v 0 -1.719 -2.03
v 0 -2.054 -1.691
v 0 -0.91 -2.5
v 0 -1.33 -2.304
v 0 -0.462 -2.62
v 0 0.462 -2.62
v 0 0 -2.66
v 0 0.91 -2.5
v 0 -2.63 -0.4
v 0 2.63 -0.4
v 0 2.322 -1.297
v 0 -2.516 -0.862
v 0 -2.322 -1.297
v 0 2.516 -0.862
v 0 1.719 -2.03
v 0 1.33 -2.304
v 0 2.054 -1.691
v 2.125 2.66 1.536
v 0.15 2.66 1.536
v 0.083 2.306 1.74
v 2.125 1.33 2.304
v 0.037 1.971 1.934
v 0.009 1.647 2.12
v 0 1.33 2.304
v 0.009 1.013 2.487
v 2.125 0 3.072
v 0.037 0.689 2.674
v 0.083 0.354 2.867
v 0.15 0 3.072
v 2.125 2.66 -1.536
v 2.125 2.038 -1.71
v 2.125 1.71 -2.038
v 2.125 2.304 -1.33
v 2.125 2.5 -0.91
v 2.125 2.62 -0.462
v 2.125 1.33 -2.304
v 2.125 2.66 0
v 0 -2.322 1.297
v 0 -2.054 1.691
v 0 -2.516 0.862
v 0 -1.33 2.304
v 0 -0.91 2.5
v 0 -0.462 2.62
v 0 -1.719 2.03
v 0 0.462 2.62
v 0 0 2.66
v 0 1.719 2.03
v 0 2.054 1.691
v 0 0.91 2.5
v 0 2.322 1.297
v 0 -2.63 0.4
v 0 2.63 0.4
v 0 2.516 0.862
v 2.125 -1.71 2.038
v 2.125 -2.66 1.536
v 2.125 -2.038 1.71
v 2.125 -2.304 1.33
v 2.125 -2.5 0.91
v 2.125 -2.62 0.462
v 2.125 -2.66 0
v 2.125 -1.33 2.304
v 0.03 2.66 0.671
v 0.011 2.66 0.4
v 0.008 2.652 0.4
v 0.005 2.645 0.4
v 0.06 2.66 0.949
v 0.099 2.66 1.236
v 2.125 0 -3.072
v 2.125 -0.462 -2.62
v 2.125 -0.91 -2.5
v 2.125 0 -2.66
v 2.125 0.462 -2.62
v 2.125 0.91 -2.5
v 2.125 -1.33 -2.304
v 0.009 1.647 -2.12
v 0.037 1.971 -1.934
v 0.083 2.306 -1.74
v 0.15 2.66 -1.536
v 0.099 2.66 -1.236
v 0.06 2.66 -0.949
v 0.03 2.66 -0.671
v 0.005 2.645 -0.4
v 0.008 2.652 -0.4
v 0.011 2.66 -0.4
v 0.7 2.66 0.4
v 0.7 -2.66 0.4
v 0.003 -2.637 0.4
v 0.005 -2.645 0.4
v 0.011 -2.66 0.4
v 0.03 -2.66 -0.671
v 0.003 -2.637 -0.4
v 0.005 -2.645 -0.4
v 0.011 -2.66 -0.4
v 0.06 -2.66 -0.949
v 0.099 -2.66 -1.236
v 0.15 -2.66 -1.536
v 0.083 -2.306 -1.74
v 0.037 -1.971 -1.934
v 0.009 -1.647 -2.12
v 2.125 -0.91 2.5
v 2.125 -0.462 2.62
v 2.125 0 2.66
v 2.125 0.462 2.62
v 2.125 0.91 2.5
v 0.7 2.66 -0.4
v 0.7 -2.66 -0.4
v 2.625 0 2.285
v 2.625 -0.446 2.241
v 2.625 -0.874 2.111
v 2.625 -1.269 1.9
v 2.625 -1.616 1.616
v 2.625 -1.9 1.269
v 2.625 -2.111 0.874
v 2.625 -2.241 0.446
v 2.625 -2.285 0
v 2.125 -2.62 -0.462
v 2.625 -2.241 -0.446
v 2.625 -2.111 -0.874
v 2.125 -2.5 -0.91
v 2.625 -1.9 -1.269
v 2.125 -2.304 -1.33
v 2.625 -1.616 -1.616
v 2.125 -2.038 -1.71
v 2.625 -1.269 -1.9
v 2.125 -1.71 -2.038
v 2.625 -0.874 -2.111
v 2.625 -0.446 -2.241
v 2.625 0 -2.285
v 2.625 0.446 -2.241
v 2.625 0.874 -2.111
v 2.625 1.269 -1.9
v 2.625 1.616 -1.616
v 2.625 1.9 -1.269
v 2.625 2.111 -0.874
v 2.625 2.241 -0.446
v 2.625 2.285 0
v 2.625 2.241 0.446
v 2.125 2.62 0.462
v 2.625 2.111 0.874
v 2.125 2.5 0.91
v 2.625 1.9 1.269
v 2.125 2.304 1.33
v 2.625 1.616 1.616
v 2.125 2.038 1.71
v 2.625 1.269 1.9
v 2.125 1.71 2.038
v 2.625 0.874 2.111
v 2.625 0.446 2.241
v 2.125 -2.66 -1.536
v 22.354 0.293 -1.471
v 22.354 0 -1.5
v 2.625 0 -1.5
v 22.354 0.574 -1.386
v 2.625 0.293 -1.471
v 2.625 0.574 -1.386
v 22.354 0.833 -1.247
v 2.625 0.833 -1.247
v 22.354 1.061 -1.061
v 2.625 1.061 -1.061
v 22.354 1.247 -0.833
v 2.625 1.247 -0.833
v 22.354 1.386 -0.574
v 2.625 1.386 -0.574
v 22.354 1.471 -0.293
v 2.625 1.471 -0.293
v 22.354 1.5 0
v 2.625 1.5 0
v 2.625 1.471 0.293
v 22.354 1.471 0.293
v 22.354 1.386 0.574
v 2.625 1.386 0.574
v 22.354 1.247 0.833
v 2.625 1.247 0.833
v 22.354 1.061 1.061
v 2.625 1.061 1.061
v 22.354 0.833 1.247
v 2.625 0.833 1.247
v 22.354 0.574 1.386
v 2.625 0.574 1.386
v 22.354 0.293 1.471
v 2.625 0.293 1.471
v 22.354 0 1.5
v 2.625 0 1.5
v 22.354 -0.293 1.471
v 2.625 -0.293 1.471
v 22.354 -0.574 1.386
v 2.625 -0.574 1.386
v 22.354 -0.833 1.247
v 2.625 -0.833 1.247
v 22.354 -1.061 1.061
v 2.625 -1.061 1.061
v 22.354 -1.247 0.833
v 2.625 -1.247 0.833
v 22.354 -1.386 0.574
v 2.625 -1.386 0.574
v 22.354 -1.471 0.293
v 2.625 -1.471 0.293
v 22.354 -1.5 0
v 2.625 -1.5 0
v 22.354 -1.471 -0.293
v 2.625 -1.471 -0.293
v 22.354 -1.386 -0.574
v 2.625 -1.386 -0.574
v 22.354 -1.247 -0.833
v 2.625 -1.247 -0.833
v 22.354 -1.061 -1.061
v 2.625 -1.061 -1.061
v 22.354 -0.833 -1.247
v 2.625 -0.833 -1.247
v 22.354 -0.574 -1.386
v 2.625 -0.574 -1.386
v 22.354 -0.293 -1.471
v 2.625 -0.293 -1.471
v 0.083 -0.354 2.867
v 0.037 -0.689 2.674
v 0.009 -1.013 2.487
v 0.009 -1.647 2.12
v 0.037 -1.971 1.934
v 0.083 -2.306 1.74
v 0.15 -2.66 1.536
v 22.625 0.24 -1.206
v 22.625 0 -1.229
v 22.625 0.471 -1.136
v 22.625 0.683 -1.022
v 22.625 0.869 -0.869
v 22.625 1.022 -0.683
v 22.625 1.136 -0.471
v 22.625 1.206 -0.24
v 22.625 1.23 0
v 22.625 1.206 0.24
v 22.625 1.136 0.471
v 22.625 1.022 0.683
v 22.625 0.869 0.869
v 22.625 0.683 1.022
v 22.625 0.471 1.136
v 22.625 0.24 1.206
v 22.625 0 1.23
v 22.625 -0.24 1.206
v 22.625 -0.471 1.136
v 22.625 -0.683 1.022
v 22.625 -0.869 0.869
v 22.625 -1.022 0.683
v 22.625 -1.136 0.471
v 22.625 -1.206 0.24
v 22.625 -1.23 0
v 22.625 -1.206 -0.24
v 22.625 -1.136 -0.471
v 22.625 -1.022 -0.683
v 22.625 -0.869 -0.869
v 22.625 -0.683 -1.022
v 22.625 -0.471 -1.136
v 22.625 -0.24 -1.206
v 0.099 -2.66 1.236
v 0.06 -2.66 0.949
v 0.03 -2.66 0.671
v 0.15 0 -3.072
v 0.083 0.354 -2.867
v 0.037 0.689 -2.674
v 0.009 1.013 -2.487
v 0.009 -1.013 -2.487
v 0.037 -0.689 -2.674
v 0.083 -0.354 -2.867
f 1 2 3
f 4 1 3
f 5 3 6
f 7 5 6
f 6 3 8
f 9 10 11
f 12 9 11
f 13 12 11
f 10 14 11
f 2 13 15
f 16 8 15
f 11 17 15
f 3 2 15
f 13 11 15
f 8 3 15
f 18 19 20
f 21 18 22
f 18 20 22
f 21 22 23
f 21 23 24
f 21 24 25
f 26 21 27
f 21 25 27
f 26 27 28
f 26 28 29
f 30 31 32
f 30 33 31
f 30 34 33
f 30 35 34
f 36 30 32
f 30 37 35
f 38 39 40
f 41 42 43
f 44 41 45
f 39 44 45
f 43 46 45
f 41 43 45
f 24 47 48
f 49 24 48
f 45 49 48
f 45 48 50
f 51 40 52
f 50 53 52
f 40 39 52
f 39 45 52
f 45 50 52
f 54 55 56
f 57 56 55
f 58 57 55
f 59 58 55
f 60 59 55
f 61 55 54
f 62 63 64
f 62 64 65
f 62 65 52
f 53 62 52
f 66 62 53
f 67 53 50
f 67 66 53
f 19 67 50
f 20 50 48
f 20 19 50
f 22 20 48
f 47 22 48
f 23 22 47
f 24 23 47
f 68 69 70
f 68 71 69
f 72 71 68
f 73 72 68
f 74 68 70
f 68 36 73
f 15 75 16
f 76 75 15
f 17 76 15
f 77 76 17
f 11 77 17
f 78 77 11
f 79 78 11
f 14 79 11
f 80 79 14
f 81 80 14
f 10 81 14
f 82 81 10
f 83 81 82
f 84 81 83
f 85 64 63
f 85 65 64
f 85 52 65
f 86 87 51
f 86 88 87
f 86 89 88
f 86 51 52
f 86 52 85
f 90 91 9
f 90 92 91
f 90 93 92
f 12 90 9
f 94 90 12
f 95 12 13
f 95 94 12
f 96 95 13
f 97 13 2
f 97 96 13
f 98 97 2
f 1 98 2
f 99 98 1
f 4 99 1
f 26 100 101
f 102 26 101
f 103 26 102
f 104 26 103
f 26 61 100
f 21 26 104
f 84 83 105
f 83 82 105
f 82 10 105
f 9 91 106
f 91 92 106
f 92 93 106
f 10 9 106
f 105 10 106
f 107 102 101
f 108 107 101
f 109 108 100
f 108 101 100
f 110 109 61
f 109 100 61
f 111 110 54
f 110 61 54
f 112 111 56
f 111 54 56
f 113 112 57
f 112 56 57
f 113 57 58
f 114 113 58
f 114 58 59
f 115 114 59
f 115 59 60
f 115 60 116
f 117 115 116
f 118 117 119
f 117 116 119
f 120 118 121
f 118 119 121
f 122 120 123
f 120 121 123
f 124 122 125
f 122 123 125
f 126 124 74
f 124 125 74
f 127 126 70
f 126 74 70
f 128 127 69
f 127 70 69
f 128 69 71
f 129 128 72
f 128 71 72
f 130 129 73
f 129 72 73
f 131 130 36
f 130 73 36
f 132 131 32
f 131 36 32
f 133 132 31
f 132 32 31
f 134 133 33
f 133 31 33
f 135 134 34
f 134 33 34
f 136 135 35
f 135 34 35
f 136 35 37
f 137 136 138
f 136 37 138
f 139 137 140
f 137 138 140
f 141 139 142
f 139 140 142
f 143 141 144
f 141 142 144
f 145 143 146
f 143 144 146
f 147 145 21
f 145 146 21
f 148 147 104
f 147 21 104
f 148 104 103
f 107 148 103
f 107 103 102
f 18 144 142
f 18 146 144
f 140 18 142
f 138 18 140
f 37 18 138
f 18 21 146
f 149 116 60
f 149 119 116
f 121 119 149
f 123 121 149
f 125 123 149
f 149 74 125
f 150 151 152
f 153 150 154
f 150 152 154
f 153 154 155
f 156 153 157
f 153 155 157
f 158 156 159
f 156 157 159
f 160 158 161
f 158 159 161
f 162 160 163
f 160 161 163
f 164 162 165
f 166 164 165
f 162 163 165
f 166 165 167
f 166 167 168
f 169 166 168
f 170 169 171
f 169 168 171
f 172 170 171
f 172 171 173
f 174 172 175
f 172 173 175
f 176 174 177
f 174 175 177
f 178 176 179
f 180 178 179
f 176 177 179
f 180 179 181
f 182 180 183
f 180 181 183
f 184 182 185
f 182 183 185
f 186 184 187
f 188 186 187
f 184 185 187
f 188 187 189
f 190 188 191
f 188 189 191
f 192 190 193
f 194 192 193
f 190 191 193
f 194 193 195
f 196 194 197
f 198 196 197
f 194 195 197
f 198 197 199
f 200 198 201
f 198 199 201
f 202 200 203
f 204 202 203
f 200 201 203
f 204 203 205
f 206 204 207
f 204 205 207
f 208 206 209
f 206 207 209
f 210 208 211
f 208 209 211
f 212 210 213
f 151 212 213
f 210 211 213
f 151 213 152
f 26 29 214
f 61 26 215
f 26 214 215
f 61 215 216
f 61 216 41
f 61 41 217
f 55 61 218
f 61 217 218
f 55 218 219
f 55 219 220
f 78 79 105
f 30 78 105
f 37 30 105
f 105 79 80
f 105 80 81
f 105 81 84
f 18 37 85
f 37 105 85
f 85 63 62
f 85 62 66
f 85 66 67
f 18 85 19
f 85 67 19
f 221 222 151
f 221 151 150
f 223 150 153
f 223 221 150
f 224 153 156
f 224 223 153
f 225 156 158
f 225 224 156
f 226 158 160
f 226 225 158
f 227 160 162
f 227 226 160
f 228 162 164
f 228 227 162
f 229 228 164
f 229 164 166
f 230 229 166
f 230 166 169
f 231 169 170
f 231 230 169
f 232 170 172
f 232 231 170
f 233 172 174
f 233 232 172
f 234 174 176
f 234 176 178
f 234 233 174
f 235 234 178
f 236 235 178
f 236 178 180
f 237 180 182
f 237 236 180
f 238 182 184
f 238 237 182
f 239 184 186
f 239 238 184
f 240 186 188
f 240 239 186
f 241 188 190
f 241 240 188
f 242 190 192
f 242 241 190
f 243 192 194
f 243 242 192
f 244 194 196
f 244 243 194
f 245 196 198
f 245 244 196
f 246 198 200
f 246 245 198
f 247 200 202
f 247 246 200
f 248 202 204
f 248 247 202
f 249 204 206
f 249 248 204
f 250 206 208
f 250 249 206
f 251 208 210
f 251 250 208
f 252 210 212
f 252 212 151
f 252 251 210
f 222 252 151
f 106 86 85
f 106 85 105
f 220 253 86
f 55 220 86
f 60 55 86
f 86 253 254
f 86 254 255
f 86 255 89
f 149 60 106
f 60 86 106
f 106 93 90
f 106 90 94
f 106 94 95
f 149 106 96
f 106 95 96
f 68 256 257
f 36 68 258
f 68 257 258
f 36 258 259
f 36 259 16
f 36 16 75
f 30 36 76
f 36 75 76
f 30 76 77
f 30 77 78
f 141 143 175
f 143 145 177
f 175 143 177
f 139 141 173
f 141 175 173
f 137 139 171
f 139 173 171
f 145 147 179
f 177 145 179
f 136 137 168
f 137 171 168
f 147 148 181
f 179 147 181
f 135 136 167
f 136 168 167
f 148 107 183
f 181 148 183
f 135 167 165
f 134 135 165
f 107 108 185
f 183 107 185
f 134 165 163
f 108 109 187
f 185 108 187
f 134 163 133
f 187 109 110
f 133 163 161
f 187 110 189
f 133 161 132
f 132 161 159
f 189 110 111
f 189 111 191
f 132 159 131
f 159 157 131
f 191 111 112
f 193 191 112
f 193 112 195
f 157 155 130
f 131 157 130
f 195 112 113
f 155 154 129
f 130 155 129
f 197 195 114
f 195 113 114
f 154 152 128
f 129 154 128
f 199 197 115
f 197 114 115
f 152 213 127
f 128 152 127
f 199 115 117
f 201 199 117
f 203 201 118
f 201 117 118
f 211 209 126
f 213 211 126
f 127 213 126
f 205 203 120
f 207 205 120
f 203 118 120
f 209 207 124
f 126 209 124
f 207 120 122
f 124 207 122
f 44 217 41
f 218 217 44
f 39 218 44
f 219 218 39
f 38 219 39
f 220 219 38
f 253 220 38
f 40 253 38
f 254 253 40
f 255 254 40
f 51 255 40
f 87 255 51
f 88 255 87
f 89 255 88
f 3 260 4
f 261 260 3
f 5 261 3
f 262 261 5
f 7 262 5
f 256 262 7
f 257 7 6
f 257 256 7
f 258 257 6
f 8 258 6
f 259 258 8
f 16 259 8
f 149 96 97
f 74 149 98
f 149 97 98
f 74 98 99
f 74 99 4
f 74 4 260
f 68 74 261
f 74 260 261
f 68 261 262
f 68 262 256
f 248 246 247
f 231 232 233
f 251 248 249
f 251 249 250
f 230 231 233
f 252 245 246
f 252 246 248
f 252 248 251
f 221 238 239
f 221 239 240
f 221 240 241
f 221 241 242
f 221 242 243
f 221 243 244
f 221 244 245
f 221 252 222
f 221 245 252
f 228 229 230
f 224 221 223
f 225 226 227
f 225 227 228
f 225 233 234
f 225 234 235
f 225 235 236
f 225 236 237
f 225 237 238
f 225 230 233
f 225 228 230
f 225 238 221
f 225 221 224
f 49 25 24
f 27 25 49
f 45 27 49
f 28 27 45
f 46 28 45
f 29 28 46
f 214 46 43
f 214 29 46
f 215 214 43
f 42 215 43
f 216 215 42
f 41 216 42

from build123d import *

# Parameters (mm, degrees)
BASEHEAD_DEPTH  = 2.125
SKETCH3_R       = 1.5
BASEBODY_DEPTH  = 20
CHAMFER1_SIZE   = 0.2705
SLOT_DEPTH      = 23.986960615
SLOT_DEPTH_BACK = 23.986960615
SKETCH5_W       = 0.7
SKETCH5_H       = 0.8


with BuildPart() as part:
    # Sketch-BaseHead → BaseHead (new body)
    with BuildSketch(Plane(origin=(0, 0, 0), x_dir=(0, 0, -1), z_dir=(1, 0, 0))):
        Polygon((1.535751716, -2.66), (3.071503432, 0), (1.535751716, 2.66), (-1.535751716, 2.66), (-3.071503432, 0), (-1.535751716, -2.66), align=None)
    extrude(amount=BASEHEAD_DEPTH)

    # Sketch1 → Revolve1 (revolve)
    with BuildSketch(Plane.XY, mode=Mode.PRIVATE) as revolve1_sk:
        Polygon((2.125, 0), (2.625, 0), (2.625, -2.285), (2.125, -2.66), align=None)
    revolve(revolve1_sk.sketch.rotate(Axis((-4.001564945, 0, 0), (1, 0, 0)), 270), axis=Axis((-4.001564945, 0, 0), (1, 0, 0)))

    # Sketch3 → BaseBody (add)
    with BuildSketch(Plane(origin=(2.625, 0, 0), x_dir=(0, 0, -1), z_dir=(1, 0, 0))):
        Circle(SKETCH3_R)
    extrude(amount=BASEBODY_DEPTH)

    # Chamfer1
    chamfer1_edges = [part.edges().sort_by_distance(p)[0] for p in [
        (22.625, 0, 1.5),
    ]]
    chamfer(chamfer1_edges, length=CHAMFER1_SIZE)

    # Sketch4 → HeadChamfer (revolve, cut)
    with BuildSketch(Plane(origin=(-0.264637255, 0, 5.916896391), x_dir=(0, 0, -1), z_dir=(0, 1, 0)), mode=Mode.PRIVATE) as headchamfer_sk:
        Polygon((8.988399823, -0.264637255), (8.576896391, -0.264637255), (8.988399823, -0.414412256), align=None)
    revolve(headchamfer_sk.sketch.rotate(Axis((-4.001564945, 0, 0), (1, 0, 0)), 180), axis=Axis((-4.001564945, 0, 0), (1, 0, 0)), mode=Mode.SUBTRACT)

    # Sketch5 → Slot (cut, two sides: drawn at the far end of the back side and taken through both)
    with BuildSketch(Plane(origin=(0, 0, 0), x_dir=(1, 0, 0), z_dir=(0, 1, 0)).offset(-SLOT_DEPTH_BACK)):
        with Locations((0.35, 0)):
            Rectangle(SKETCH5_W, SKETCH5_H)
    extrude(amount=SLOT_DEPTH + SLOT_DEPTH_BACK, mode=Mode.SUBTRACT)


solid = part.part
